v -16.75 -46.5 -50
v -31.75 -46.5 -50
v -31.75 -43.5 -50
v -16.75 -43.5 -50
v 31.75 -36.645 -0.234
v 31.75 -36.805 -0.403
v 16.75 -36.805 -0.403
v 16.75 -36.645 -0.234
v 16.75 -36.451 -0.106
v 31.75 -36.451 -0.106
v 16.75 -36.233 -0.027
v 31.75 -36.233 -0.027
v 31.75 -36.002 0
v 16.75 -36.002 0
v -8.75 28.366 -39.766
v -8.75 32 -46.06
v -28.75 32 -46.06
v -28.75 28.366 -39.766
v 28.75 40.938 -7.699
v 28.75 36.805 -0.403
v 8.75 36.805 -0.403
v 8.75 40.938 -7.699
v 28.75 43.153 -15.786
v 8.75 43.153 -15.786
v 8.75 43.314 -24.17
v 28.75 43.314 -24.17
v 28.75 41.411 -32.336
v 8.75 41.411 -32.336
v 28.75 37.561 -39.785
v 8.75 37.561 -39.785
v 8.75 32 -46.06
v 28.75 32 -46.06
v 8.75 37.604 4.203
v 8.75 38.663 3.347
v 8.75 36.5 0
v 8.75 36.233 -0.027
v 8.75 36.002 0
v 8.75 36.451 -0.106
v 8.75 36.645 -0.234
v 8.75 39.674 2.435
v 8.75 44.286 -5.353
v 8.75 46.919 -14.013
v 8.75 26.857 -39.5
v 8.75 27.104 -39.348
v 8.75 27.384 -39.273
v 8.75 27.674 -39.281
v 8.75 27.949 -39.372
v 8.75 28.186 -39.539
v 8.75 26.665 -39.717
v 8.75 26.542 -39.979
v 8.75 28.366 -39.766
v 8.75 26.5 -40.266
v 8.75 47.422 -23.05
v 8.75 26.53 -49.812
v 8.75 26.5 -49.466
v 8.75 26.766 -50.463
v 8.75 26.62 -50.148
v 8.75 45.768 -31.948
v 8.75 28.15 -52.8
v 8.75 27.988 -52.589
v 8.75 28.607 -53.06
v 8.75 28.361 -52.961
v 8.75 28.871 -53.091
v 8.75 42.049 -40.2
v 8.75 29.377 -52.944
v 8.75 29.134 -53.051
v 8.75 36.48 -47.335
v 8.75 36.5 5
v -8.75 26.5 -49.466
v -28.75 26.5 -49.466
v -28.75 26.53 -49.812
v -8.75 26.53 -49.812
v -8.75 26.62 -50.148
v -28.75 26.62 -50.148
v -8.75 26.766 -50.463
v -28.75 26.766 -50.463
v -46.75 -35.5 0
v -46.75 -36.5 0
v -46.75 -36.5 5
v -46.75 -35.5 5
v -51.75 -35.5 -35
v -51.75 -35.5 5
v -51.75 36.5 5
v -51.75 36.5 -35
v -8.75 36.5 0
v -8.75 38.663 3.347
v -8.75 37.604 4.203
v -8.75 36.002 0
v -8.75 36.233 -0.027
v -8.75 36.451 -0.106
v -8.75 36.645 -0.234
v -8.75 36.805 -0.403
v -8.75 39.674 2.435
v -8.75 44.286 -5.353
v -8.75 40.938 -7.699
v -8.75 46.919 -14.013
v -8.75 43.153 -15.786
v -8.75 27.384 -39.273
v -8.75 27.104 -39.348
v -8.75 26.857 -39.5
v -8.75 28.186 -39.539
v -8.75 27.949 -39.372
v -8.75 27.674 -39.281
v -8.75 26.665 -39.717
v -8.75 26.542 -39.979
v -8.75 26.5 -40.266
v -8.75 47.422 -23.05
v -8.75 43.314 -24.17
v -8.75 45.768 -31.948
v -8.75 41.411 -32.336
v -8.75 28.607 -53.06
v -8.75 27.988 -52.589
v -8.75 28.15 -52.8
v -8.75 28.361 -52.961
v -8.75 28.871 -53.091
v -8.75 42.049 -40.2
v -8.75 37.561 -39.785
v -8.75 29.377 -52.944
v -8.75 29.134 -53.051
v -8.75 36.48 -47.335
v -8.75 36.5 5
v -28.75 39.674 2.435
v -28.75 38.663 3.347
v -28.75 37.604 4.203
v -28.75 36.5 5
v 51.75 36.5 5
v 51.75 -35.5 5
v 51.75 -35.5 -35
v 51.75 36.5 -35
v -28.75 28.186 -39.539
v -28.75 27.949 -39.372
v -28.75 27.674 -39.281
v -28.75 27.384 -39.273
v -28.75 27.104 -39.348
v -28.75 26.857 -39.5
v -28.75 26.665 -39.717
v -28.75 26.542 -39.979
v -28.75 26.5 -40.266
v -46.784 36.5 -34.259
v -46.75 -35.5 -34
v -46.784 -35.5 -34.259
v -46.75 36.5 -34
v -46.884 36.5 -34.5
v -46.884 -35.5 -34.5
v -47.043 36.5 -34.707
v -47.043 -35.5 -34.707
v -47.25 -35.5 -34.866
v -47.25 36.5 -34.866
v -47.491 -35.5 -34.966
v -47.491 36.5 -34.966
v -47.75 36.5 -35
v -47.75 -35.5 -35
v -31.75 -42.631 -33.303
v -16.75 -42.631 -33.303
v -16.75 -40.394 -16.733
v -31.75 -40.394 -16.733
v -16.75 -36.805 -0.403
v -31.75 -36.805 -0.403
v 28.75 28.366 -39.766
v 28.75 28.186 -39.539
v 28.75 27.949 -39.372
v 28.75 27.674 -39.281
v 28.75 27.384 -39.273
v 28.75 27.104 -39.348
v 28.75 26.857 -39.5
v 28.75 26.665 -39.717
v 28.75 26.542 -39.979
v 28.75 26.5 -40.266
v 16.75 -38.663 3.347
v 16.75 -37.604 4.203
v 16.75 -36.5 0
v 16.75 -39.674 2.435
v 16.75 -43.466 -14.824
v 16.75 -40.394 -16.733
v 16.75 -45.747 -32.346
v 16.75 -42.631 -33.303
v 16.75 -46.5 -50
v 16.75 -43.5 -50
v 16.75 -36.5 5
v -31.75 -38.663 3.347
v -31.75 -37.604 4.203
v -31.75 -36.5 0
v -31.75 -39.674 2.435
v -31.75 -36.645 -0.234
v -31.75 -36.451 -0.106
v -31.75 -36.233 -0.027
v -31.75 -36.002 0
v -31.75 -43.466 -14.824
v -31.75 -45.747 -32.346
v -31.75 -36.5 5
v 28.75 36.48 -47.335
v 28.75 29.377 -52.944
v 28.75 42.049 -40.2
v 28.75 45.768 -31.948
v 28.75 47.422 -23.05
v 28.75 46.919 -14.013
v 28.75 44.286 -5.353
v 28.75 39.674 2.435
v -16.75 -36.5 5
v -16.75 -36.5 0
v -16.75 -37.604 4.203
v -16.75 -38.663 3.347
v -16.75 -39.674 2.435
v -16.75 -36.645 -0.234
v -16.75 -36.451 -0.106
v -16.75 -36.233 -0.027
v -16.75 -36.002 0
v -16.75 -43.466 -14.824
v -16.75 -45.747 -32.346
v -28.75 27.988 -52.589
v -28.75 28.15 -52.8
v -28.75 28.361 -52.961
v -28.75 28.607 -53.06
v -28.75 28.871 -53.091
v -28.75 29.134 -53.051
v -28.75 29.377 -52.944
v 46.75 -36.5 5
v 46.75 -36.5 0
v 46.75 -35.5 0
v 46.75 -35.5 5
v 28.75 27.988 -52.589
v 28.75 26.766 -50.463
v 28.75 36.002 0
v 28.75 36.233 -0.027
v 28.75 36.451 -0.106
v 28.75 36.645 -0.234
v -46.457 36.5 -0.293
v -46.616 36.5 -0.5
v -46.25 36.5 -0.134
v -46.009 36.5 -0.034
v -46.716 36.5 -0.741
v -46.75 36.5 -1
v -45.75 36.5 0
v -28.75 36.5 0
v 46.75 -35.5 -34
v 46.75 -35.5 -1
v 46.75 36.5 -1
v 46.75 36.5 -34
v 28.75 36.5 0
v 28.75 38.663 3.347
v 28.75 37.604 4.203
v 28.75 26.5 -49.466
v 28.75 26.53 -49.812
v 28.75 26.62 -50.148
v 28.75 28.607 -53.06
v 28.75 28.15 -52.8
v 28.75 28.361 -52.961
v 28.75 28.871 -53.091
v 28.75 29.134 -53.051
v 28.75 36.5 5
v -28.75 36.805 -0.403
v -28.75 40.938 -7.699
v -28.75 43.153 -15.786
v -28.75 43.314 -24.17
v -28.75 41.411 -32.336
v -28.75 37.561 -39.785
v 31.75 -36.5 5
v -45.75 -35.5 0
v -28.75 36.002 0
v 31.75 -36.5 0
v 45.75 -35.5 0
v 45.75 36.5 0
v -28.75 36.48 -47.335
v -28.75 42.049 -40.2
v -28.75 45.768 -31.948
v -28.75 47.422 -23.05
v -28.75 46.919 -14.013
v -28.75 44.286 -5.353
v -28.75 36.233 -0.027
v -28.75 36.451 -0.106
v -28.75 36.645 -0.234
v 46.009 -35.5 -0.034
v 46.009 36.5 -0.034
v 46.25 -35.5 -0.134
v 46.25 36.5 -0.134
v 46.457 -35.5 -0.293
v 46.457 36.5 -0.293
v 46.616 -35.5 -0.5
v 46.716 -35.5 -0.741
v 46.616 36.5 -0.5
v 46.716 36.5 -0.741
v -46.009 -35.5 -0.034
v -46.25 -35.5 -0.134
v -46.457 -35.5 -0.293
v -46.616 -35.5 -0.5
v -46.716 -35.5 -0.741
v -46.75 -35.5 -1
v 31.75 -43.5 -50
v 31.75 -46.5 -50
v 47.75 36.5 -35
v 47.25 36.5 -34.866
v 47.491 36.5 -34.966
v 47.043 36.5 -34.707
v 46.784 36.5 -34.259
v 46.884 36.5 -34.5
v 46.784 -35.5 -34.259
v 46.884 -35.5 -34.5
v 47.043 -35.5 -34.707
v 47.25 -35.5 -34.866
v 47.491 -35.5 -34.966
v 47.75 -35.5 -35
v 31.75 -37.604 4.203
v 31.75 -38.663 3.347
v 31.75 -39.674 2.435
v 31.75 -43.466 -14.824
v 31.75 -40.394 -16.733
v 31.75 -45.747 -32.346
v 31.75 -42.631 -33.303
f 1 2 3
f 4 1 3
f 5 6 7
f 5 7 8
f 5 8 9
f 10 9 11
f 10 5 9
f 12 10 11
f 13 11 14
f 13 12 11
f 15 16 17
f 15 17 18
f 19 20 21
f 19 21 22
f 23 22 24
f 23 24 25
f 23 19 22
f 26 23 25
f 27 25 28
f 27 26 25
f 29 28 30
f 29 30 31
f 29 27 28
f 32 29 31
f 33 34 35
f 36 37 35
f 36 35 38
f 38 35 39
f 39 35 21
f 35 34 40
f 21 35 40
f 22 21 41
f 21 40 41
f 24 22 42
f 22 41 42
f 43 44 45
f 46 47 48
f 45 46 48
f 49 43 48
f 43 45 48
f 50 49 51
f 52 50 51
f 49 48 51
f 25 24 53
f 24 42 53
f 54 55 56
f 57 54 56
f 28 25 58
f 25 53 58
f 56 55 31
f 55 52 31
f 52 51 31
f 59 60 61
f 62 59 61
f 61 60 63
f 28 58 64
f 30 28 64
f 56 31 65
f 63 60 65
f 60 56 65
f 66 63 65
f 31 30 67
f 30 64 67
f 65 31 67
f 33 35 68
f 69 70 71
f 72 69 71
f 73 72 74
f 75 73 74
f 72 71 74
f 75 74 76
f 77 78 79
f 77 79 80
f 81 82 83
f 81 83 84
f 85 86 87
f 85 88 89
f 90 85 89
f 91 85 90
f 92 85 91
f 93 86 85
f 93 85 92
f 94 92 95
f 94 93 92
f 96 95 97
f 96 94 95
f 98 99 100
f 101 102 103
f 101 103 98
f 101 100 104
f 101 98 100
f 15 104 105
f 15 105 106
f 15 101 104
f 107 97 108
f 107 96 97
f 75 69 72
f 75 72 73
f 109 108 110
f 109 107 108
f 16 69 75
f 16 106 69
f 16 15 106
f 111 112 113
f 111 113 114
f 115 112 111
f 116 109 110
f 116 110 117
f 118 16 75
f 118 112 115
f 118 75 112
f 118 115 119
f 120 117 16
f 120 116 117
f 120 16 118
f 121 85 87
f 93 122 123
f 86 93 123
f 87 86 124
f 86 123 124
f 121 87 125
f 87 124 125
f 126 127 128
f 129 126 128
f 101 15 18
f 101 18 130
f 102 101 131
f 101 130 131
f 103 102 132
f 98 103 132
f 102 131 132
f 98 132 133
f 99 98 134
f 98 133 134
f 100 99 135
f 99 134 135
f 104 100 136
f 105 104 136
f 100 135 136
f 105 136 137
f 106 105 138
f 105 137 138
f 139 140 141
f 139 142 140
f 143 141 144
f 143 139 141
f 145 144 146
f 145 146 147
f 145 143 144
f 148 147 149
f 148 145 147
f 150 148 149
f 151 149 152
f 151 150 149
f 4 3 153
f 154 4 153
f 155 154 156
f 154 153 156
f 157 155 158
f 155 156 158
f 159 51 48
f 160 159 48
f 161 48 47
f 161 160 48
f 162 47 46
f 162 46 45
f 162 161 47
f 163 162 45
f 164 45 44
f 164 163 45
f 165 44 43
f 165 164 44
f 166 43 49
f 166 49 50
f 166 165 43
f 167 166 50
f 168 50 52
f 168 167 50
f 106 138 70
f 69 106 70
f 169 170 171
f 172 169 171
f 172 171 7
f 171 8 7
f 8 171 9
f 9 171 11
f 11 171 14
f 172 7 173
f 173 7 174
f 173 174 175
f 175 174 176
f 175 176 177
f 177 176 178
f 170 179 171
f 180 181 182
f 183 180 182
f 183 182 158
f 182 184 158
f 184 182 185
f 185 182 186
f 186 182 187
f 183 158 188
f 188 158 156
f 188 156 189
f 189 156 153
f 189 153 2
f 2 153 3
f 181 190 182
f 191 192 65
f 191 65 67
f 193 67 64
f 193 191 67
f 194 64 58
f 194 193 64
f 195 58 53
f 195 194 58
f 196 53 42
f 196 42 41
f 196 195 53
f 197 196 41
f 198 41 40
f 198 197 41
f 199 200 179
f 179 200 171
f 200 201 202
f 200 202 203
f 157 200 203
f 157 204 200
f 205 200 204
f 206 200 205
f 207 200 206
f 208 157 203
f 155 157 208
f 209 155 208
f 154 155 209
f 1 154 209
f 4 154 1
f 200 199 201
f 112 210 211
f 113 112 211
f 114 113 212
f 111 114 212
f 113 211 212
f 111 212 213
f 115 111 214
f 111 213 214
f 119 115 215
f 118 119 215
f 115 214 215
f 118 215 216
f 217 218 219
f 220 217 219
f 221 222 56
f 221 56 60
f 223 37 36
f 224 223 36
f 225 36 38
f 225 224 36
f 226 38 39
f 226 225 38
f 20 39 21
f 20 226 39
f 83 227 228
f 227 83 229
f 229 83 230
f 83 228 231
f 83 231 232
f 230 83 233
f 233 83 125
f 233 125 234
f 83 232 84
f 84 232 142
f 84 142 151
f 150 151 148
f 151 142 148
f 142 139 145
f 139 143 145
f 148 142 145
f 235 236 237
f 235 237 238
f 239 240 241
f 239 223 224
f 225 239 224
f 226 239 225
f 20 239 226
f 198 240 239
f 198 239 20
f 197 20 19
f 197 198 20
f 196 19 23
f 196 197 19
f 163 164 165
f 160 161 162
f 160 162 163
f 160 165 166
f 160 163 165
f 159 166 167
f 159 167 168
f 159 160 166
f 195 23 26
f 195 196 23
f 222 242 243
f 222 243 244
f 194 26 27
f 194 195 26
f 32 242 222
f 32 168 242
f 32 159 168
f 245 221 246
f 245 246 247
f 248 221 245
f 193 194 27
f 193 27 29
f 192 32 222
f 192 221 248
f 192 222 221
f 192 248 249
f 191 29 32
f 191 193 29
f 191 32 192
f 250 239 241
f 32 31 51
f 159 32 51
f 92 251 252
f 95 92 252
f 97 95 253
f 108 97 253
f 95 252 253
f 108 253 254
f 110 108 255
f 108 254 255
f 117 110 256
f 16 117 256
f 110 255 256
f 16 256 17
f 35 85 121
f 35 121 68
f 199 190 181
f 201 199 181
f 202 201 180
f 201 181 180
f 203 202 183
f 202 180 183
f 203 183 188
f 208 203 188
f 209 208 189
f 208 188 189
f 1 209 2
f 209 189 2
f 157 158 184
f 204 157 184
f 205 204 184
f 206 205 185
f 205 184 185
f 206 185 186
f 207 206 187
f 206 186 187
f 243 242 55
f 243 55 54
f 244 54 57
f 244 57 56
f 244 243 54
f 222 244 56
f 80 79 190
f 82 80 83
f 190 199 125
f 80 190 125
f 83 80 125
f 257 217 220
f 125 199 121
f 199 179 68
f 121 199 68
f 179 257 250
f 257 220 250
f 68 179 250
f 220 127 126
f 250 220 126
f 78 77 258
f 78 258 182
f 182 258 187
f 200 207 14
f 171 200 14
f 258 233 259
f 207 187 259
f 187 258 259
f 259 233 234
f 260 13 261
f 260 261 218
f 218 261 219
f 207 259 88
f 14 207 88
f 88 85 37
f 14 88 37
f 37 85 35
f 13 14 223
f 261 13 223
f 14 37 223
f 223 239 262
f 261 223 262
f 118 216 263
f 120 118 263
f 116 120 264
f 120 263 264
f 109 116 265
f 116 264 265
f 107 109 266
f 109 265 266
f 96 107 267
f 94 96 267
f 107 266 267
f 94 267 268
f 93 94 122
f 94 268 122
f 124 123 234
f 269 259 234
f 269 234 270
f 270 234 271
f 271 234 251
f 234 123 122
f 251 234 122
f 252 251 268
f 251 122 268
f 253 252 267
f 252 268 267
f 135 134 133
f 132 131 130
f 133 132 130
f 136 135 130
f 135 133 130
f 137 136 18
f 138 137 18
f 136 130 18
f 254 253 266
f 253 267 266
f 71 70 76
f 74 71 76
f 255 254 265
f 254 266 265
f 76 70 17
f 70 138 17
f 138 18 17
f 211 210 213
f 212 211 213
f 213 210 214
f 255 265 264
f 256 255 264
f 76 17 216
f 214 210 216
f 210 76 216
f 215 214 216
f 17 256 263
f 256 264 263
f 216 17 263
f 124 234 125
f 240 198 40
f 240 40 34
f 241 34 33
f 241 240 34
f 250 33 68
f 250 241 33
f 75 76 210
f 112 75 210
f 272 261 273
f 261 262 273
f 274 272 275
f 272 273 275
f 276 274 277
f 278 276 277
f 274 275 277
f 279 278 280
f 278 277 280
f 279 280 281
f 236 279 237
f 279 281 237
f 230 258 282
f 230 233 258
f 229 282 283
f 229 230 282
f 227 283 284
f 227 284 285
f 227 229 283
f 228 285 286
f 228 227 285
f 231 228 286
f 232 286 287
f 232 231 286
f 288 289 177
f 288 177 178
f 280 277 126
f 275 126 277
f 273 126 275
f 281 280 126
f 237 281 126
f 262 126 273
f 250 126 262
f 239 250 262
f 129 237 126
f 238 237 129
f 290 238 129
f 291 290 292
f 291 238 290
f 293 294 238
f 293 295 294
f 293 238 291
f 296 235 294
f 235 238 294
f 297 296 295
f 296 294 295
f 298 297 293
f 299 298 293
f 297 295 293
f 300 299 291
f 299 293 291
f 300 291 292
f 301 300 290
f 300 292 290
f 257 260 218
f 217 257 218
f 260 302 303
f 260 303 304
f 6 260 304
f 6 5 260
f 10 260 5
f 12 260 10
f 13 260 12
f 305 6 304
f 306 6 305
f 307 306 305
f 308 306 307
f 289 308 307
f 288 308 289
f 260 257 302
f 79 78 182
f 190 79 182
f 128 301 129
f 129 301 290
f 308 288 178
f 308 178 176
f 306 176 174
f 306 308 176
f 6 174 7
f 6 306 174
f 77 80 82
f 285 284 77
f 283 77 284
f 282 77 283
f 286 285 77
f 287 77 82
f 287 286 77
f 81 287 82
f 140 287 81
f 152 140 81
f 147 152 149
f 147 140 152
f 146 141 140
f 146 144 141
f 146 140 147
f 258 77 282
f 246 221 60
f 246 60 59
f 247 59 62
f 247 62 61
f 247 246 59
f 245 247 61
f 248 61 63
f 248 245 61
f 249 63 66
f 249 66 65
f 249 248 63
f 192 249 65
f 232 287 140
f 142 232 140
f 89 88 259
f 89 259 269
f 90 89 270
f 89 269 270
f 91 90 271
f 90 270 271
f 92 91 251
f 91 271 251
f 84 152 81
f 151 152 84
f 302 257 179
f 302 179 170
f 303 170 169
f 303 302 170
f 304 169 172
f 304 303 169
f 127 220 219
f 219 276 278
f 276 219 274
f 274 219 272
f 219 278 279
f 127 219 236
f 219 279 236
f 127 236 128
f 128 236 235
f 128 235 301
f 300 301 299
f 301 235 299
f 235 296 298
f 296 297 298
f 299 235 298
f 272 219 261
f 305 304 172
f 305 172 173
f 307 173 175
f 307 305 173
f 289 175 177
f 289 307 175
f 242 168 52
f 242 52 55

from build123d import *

# Parameters (mm, degrees)
SKETCH1_W           = 93.5
SKETCH1_H           = 73
BOSS_EXTRUDE1_DEPTH = 5
BOSS_EXTRUDE3_START = -18
BOSS_EXTRUDE3_DEPTH = 20
SKETCH3_W           = 40
SKETCH3_H           = 72
BOSS_EXTRUDE4_DEPTH = 5
FILLET2_R           = 1
BOSS_EXTRUDE5_START = -15
BOSS_EXTRUDE5_DEPTH = 15


with BuildPart() as part:
    # Sketch1 → Boss-Extrude1 (new body)
    with BuildSketch(Plane.XY):
        Rectangle(SKETCH1_W, SKETCH1_H)
    extrude(amount=BOSS_EXTRUDE1_DEPTH)

    # Sketch2 → Boss-Extrude3 (add)
    with BuildSketch(Plane(origin=(46.75, 0, 0), x_dir=(0, 0, -1), z_dir=(1, 0, 0)).offset(BOSS_EXTRUDE3_START)):
        with BuildLine():
            ThreePointArc((-2.434820811, 39.673585924), (-3.782270226, 38.139218536), (-5, 36.5))
            Line((-5, 36.5), (0, 36.5))
            Line((0, 36.5), (0, 36.002201306))
            ThreePointArc((0, 36.002201306), (0.106466288, 36.451197416), (0.403195013, 36.804587627))
            ThreePointArc((0.403195013, 36.804587627), (24.169553289, 43.313947092), (46.060330973, 32))
            Line((46.060330973, 32), (39.766102339, 28.366025404))
            ThreePointArc((39.766102339, 28.366025404), (39.300176512, 27.241180955), (40.266102339, 26.5))
            Line((40.266102339, 26.5), (49.466267311, 26.5))
            ThreePointArc((49.466267311, 26.5), (49.981952839, 26.567626217), (50.462764505, 26.765931563))
            Line((50.462764505, 26.765931563), (52.589346112, 27.987989793))
            ThreePointArc((52.589346112, 27.987989793), (53.05994511, 28.607366306), (52.944303456, 29.376598189))
            ThreePointArc((52.944303456, 29.376598189), (27.548560845, 46.861682099), (-2.434820811, 39.673585924))
        make_face()
    boss_extrude3 = extrude(amount=-BOSS_EXTRUDE3_DEPTH)

    # Mirror1: Boss-Extrude3 across plane
    add(boss_extrude3.mirror(Plane(origin=(0, 0, 0), x_dir=(0, 0, 1), z_dir=(1, 0, 0))))

    # Sketch3 → Boss-Extrude4 (add)
    with BuildSketch(Plane(origin=(46.75, 0, 0), x_dir=(0, 0, -1), z_dir=(1, 0, 0))):
        with Locations((15, 0.5)):
            Rectangle(SKETCH3_W, SKETCH3_H)
    boss_extrude4 = extrude(amount=BOSS_EXTRUDE4_DEPTH)

    # Mirror3: Boss-Extrude4 across plane
    add(boss_extrude4.mirror(Plane(origin=(0, 0, 0), x_dir=(0, 0, 1), z_dir=(1, 0, 0))))

    # Fillet2
    fillet2_edges = [part.edges().sort_by_distance(p)[0] for p in [
        (46.75, 0.5, -35),
        (-46.75, 0.5, -35),
        (-46.75, 0.5, 0),
        (46.75, 0.5, 0),
    ]]
    fillet(fillet2_edges, radius=FILLET2_R)

    # Sketch2<5> → Boss-Extrude5 (add)
    with BuildSketch(Plane(origin=(46.75, 0, 0), x_dir=(0, 0, -1), z_dir=(1, 0, 0)).offset(BOSS_EXTRUDE5_START)):
        with BuildLine():
            ThreePointArc((0.403195013, -36.804587627), (0.106466288, -36.451197416), (0, -36.002201306))
            Line((0, -36.002201306), (0, -36.5))
            Line((0, -36.5), (-5, -36.5))
            ThreePointArc((-5, -36.5), (-3.782270226, -38.139218536), (-2.434820811, -39.673585924))
            ThreePointArc((-2.434820811, -39.673585924), (23.559962361, -44.796829736), (50, -46.5))
            Line((50, -46.5), (50, -43.5))
            ThreePointArc((50, -43.5), (24.995023445, -41.682507765), (0.403195013, -36.804587627))
        make_face()
    boss_extrude5 = extrude(amount=-BOSS_EXTRUDE5_DEPTH)

    # Mirror4: Boss-Extrude5 across plane
    add(boss_extrude5.mirror(Plane(origin=(0, 0, 0), x_dir=(0, 0, 1), z_dir=(1, 0, 0))))


solid = part.part
